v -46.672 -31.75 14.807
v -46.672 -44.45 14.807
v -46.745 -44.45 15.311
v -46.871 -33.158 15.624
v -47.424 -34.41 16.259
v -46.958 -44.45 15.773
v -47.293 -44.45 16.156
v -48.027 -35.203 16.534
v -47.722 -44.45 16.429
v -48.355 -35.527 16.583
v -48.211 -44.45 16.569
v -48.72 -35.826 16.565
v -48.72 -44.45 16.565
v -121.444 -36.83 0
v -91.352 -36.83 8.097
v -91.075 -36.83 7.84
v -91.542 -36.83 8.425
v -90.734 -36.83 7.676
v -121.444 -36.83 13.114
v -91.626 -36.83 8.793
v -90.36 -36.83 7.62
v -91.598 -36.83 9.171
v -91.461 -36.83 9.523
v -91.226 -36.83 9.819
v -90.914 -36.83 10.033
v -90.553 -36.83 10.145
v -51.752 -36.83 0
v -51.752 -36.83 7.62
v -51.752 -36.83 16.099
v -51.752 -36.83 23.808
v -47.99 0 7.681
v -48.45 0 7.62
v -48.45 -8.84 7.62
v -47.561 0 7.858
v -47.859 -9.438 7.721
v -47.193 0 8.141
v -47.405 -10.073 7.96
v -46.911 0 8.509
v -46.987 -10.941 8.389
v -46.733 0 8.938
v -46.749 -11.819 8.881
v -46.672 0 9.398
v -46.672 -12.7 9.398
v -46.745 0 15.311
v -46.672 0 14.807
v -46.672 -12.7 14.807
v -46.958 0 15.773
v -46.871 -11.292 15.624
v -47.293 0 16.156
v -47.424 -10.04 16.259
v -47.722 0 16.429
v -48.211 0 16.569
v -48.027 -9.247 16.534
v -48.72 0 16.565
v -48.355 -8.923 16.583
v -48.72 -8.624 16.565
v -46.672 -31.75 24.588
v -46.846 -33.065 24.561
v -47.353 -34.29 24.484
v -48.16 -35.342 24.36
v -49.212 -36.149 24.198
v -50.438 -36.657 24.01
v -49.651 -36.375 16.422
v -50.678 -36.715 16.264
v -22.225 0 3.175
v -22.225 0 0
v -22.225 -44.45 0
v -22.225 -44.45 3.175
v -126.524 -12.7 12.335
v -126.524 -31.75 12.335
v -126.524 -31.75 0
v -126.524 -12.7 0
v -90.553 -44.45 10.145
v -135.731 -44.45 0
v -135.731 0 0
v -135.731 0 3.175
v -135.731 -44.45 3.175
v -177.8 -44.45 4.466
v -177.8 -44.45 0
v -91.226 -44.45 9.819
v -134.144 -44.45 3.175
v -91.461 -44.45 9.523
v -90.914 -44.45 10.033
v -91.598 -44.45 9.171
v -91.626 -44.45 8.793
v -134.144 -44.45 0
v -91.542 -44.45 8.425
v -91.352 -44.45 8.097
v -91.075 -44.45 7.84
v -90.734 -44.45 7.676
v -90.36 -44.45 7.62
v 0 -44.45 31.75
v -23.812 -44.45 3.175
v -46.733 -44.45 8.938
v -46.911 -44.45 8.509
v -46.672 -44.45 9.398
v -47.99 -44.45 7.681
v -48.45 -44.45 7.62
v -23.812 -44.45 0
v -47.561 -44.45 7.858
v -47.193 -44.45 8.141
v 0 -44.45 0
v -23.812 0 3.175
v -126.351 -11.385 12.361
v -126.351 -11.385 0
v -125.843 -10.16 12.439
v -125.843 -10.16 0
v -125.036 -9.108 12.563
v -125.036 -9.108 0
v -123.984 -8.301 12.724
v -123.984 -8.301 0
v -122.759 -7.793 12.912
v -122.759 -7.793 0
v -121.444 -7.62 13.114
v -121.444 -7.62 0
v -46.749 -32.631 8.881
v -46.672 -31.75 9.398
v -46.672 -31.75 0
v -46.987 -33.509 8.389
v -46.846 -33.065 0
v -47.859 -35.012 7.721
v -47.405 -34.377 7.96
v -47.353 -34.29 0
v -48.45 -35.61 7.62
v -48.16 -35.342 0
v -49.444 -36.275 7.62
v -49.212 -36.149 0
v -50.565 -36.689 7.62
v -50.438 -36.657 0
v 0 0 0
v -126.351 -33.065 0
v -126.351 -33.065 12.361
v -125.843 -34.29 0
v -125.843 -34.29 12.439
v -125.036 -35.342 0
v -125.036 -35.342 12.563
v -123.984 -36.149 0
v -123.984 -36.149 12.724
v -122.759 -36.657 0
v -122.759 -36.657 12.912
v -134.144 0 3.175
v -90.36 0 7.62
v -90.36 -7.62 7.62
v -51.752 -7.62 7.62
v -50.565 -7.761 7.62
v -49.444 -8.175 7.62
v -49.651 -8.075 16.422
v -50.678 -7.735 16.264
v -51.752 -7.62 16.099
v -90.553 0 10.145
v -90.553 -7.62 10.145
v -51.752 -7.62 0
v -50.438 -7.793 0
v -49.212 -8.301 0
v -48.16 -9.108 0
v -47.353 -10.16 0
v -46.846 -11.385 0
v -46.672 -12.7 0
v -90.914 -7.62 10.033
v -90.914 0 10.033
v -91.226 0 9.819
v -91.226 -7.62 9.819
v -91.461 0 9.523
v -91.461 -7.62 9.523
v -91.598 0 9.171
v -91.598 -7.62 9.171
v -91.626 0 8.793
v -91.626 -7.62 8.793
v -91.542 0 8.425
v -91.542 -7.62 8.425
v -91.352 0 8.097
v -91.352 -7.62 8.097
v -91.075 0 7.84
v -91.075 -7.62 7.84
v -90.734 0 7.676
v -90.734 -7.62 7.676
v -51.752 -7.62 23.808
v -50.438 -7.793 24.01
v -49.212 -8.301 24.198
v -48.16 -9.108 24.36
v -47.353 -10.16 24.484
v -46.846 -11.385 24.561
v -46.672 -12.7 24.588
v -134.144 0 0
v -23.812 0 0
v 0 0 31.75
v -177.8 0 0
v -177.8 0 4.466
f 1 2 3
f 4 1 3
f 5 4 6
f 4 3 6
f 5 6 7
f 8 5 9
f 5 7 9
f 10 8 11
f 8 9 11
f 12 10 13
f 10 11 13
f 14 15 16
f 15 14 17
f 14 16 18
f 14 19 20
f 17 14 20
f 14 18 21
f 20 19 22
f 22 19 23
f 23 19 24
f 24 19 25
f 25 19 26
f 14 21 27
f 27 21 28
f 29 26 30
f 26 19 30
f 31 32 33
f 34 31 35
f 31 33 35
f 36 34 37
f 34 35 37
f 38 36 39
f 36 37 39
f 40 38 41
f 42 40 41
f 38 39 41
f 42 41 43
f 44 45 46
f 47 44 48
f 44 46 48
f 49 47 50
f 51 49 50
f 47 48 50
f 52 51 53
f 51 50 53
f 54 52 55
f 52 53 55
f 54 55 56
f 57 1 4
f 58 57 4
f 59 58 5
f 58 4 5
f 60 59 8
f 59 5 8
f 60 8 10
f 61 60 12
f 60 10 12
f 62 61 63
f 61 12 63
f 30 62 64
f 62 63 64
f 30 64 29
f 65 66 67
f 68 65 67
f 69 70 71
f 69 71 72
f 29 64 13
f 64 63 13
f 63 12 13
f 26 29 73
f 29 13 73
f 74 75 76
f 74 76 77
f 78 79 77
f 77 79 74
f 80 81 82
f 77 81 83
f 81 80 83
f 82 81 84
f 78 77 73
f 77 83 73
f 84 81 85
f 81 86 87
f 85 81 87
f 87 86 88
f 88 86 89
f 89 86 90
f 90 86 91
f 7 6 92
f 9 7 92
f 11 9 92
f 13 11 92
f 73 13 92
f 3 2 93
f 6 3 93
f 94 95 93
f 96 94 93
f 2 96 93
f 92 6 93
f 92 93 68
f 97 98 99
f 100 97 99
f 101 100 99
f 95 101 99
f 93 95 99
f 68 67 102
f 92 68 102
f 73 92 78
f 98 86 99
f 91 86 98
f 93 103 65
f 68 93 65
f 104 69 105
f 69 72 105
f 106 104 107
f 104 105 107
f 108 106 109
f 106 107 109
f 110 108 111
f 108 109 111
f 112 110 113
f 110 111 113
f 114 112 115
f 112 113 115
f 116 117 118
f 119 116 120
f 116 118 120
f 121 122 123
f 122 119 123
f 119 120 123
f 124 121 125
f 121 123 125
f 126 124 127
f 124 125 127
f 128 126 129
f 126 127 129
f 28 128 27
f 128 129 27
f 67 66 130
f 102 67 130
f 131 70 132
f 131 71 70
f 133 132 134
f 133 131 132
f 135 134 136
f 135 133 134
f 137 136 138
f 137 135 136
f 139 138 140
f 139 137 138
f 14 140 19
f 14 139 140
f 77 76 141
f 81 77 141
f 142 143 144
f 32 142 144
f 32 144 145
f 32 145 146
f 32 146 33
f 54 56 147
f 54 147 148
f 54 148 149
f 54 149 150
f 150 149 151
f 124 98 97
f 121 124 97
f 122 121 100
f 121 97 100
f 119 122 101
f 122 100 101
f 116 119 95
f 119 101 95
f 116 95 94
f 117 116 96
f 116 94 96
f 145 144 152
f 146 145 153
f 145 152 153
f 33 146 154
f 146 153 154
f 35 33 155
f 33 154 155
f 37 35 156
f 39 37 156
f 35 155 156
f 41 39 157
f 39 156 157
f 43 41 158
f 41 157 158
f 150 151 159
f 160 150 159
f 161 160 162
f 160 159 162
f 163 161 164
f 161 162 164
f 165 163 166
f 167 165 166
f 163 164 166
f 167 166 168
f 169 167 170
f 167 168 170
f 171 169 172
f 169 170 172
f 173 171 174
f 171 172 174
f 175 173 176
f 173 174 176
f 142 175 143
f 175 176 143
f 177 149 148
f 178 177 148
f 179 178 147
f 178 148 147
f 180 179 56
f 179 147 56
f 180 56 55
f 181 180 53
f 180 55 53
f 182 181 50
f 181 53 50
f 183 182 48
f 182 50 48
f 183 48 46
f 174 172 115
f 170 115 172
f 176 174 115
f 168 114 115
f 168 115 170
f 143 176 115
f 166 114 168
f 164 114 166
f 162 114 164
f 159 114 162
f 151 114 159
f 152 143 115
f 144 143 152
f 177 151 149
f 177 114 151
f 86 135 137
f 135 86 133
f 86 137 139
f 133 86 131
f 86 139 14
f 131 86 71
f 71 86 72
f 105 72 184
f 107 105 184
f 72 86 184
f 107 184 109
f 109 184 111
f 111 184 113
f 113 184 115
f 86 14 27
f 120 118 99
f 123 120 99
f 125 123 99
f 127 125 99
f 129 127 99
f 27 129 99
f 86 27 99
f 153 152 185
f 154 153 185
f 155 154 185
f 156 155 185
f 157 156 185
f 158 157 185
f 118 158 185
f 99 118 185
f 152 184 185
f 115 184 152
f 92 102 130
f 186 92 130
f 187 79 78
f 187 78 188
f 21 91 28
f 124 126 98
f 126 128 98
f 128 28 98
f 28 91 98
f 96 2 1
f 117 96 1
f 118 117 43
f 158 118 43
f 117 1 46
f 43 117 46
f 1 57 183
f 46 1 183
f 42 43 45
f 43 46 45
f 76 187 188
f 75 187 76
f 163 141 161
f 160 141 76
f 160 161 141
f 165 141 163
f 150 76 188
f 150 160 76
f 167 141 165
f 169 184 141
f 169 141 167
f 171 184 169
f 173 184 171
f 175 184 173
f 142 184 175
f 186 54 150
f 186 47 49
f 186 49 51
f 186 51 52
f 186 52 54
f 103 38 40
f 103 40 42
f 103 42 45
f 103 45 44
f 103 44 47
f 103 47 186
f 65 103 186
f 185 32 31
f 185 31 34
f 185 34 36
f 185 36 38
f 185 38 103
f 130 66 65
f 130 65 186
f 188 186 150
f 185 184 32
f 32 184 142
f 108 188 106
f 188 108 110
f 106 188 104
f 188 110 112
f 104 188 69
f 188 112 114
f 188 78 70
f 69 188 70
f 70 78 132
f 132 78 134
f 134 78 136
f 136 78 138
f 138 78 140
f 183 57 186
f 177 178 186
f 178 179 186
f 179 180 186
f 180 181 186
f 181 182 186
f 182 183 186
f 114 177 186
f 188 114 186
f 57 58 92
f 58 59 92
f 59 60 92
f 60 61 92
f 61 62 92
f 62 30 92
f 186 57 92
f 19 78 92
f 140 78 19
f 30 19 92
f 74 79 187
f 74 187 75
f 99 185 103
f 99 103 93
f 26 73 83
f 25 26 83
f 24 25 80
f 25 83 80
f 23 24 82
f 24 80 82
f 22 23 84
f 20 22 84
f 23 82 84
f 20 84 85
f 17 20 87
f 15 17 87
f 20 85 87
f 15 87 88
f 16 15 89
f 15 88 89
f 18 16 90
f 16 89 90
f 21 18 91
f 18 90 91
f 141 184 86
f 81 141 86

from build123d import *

# Parameters (mm, degrees)
F0_W      = 177.8
F0_H      = 44.45
F1_DEPTH  = 31.75
F2_W      = 1.5875
F2_H      = 44.45
F3_DEPTH  = 3.175
F4_W      = 79.85125
F4_H      = 29.21
F5_DEPTH  = 31.751
F7_DEPTH  = 44.451
F8_R      = 5.08
F10_DEPTH = 44.451


with BuildPart() as f1:
    # F0 (on Top) → F1 (new body)
    with BuildSketch(Plane.XY):
        with Locations((-88.9, -22.225)):
            Rectangle(F0_W, F0_H)
    extrude(amount=F1_DEPTH)

    # F2 (on face) → F3 (cut)
    with BuildSketch(Plane(origin=(0, 0, 0), x_dir=(1, 0, 0), z_dir=(0, 0, -1))):
        with Locations((-23.01875, 22.225)):
            Rectangle(F2_W, F2_H)
        with Locations((-134.9375, 22.225)):
            Rectangle(F2_W, F2_H)
    extrude(amount=-F3_DEPTH, mode=Mode.SUBTRACT)

    # F4 (on face) → F5 (cut, through all)
    with BuildSketch(Plane.XY.offset(31.75)):
        with Locations((-86.598125, -22.225)):
            Rectangle(F4_W, F4_H)
    extrude(amount=-F5_DEPTH, mode=Mode.SUBTRACT)

    # F6 (on face) → F7 (cut, through all)
    with BuildSketch(Plane.XZ.offset(44.45)):
        Polygon((-177.8, 31.75), (-177.8, 4.466168), (0, 31.75), align=None)
    extrude(amount=-F7_DEPTH, mode=Mode.SUBTRACT)

    # F8
    f8_edges = [f1.edges().sort_by_distance(p)[0] for p in [
        (-126.52375, -7.62, 6.167315),
        (-46.6725, -7.62, 12.293997),
        (-126.52375, -36.83, 6.167315),
        (-46.6725, -36.83, 12.293997),
    ]]
    fillet(f8_edges, radius=F8_R)

    # F9 (on face) → F10 (cut, through all)
    with BuildSketch(Plane.XZ.offset(44.45)):
        with BuildLine():
            Line((-48.720182, 16.564578), (-90.55252, 10.145306))
            ThreePointArc((-90.55252, 10.145306), (-91.626212, 8.793405), (-90.35989, 7.62))
            Line((-90.35989, 7.62), (-48.4505, 7.62))
            ThreePointArc((-48.4505, 7.62), (-47.193264, 8.140764), (-46.6725, 9.398))
            Line((-46.6725, 9.398), (-46.6725, 14.807149))
            ThreePointArc((-46.6725, 14.807149), (-47.29253, 16.156367), (-48.720182, 16.564578))
        make_face()
    extrude(amount=-F10_DEPTH, mode=Mode.SUBTRACT)


solid = f1.part
